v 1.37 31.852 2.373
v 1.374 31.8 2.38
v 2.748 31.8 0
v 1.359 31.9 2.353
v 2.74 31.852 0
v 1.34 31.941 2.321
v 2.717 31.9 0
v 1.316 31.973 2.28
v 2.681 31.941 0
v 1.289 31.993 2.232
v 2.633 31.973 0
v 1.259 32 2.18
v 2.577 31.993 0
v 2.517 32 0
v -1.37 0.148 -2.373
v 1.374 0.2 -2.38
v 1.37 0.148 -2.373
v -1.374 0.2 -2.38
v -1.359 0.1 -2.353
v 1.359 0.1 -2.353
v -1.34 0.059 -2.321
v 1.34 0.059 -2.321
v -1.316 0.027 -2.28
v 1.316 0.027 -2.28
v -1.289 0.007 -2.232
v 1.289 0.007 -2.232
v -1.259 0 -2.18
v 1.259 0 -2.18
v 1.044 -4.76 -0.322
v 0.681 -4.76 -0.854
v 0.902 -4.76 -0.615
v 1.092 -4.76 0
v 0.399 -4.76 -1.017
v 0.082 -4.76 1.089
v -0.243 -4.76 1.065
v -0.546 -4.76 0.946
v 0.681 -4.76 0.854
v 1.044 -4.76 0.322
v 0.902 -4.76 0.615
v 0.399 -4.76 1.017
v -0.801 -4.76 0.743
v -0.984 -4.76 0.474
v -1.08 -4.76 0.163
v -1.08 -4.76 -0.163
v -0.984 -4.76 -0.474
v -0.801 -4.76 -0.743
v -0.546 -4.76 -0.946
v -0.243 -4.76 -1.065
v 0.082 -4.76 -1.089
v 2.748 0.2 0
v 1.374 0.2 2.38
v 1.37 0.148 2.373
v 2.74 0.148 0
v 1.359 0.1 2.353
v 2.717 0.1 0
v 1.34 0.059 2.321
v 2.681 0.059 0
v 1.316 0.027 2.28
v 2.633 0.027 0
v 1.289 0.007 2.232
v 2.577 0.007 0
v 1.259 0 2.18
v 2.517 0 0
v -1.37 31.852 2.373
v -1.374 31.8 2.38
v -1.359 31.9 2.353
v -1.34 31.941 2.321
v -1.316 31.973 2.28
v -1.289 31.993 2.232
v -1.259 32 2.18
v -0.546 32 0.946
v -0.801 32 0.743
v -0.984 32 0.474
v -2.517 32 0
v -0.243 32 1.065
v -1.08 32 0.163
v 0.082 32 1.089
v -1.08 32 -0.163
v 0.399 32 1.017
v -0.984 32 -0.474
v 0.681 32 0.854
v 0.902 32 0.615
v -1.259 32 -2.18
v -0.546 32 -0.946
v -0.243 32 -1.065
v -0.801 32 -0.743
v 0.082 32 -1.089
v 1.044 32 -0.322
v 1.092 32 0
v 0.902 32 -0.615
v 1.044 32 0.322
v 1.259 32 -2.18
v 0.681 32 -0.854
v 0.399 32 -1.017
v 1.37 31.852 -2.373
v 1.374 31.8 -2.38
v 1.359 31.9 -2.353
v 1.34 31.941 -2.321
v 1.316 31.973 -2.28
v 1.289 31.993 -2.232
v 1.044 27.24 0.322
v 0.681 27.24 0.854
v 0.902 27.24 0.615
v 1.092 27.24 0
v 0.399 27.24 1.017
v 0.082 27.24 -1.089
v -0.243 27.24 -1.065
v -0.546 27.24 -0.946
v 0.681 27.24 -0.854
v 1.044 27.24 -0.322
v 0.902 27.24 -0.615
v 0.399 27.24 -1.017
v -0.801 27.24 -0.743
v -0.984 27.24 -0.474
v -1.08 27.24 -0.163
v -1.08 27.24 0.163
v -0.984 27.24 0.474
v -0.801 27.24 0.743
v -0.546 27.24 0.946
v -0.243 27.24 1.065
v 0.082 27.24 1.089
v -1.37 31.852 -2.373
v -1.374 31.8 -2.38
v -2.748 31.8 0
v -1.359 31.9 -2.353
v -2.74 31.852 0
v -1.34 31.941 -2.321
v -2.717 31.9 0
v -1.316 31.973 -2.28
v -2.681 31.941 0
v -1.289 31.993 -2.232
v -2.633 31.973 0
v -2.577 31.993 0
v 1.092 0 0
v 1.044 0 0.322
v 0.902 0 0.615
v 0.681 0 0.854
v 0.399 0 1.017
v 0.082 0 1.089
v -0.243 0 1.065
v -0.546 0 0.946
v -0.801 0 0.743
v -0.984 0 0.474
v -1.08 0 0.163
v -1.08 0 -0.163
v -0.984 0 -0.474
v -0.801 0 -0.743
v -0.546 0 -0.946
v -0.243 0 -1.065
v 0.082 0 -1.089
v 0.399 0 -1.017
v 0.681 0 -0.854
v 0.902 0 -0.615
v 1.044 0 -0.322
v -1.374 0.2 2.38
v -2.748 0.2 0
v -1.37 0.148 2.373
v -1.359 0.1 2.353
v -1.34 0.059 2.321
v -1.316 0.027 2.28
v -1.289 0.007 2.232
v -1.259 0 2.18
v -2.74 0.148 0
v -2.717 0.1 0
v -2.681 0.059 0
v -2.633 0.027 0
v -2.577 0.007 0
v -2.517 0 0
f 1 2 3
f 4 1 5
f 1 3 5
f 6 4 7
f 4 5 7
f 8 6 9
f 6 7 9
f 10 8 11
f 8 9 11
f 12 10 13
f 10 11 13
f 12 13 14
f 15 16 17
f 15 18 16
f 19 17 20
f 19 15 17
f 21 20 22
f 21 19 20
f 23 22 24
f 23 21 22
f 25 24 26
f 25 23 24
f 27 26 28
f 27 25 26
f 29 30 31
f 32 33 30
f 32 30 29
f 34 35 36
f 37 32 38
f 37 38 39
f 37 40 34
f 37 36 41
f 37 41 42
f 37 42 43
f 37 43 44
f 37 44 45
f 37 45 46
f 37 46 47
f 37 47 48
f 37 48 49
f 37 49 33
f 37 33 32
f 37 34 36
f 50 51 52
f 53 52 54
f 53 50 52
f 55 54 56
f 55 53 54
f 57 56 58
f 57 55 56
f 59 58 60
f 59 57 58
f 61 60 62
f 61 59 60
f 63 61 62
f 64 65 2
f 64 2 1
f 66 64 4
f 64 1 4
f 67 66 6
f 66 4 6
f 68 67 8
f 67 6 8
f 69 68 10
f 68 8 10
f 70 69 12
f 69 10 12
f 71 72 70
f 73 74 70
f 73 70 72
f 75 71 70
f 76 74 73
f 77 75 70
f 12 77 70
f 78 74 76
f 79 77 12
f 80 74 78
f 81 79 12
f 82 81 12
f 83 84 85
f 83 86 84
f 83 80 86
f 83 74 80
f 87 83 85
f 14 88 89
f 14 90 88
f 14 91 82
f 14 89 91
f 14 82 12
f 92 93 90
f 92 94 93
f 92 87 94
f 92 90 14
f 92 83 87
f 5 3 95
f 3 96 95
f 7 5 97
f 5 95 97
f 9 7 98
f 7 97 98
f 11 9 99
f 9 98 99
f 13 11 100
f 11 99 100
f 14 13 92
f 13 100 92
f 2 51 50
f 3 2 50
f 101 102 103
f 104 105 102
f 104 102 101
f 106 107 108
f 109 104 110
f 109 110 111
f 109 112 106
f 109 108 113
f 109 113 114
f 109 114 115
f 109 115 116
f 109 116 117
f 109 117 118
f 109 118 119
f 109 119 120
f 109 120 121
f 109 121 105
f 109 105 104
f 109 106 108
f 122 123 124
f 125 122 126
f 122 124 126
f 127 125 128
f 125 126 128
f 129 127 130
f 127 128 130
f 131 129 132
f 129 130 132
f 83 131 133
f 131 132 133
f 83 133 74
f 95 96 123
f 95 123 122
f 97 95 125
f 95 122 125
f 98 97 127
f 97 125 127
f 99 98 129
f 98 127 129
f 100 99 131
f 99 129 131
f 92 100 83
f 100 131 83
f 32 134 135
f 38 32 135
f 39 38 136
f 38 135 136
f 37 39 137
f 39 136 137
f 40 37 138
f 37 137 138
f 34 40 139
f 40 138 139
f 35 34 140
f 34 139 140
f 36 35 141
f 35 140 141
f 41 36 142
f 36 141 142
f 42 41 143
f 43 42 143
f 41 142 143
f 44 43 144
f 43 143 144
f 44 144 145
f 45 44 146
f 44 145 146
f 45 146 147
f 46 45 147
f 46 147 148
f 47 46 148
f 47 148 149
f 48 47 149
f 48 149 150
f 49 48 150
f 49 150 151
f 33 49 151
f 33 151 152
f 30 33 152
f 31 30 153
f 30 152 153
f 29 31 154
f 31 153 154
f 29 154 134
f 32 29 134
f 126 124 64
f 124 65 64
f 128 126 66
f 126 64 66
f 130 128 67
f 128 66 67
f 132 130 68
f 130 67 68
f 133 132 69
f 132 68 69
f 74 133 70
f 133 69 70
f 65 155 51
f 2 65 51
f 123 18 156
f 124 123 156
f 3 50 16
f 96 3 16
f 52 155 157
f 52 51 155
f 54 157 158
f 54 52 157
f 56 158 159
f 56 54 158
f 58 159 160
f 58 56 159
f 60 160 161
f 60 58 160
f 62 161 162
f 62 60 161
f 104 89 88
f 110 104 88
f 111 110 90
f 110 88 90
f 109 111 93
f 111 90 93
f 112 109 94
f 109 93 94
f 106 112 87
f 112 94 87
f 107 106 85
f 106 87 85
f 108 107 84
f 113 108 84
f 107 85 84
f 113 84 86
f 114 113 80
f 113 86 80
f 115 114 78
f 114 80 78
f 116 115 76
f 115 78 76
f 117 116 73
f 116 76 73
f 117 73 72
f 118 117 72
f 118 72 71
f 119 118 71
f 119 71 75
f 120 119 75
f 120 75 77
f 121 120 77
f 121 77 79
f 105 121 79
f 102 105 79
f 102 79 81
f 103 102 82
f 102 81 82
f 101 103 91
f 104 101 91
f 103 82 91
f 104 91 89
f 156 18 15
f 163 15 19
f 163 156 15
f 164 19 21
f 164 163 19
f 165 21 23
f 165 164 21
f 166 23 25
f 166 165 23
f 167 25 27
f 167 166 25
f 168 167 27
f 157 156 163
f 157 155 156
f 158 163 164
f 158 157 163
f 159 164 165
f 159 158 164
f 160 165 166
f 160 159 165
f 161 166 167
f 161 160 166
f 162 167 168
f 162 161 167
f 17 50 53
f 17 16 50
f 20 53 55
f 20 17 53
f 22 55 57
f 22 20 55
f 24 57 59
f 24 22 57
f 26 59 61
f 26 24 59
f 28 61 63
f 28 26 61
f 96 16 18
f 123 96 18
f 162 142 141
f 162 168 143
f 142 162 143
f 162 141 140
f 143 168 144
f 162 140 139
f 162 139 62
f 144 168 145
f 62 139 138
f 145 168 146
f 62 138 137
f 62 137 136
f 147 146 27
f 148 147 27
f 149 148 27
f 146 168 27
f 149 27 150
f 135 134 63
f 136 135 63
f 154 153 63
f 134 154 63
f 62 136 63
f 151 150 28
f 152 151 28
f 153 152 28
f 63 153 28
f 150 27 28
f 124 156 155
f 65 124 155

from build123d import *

# Parameters (mm, degrees)
RESSALTO_EXTRUS_O1_DEPTH = 32
FILETE1_R                = 0.2
ESBO_O2_R                = 1.0922
RESSALTO_EXTRUS_O2_DEPTH = 4.76
ESBO_O3_R                = 1.0922
CORTE_EXTRUS_O1_DEPTH    = 4.76


with BuildPart() as part:
    # Esboço1 → Ressalto-extrusão1 (new body)
    with BuildSketch(Plane(origin=(0, 0, 0), x_dir=(1, 0, 0), z_dir=(0, 1, 0))):
        Polygon((2.748187281, 0), (1.374093641, 2.38), (-1.374093641, 2.38), (-2.748187281, 0), (-1.374093641, -2.38), (1.374093641, -2.38), align=None)
    extrude(amount=RESSALTO_EXTRUS_O1_DEPTH)

    # Filete1
    filete1_edges = [part.edges().sort_by_distance(p)[0] for p in [
        (0, 32, -2.38),
        (-2.061140461, 32, -1.19),
        (-2.061140461, 32, 1.19),
        (0, 32, 2.38),
        (2.061140461, 32, 1.19),
        (0, 0, 2.38),
        (-2.061140461, 0, 1.19),
        (-2.061140461, 0, -1.19),
        (2.061140461, 32, -1.19),
        (0, 0, -2.38),
        (2.061140461, 0, -1.19),
        (2.061140461, 0, 1.19),
    ]]
    fillet(filete1_edges, radius=FILETE1_R)

    # Esboço2 → Ressalto-extrusão2 (add)
    with BuildSketch(Plane.XZ):
        Circle(ESBO_O2_R)
    extrude(amount=RESSALTO_EXTRUS_O2_DEPTH)

    # Esboço3 → Corte-extrusão1 (cut)
    with BuildSketch(Plane(origin=(0, 32, 0), x_dir=(1, 0, 0), z_dir=(0, 1, 0))):
        Circle(ESBO_O3_R)
    extrude(amount=-CORTE_EXTRUS_O1_DEPTH, mode=Mode.SUBTRACT)


solid = part.part
